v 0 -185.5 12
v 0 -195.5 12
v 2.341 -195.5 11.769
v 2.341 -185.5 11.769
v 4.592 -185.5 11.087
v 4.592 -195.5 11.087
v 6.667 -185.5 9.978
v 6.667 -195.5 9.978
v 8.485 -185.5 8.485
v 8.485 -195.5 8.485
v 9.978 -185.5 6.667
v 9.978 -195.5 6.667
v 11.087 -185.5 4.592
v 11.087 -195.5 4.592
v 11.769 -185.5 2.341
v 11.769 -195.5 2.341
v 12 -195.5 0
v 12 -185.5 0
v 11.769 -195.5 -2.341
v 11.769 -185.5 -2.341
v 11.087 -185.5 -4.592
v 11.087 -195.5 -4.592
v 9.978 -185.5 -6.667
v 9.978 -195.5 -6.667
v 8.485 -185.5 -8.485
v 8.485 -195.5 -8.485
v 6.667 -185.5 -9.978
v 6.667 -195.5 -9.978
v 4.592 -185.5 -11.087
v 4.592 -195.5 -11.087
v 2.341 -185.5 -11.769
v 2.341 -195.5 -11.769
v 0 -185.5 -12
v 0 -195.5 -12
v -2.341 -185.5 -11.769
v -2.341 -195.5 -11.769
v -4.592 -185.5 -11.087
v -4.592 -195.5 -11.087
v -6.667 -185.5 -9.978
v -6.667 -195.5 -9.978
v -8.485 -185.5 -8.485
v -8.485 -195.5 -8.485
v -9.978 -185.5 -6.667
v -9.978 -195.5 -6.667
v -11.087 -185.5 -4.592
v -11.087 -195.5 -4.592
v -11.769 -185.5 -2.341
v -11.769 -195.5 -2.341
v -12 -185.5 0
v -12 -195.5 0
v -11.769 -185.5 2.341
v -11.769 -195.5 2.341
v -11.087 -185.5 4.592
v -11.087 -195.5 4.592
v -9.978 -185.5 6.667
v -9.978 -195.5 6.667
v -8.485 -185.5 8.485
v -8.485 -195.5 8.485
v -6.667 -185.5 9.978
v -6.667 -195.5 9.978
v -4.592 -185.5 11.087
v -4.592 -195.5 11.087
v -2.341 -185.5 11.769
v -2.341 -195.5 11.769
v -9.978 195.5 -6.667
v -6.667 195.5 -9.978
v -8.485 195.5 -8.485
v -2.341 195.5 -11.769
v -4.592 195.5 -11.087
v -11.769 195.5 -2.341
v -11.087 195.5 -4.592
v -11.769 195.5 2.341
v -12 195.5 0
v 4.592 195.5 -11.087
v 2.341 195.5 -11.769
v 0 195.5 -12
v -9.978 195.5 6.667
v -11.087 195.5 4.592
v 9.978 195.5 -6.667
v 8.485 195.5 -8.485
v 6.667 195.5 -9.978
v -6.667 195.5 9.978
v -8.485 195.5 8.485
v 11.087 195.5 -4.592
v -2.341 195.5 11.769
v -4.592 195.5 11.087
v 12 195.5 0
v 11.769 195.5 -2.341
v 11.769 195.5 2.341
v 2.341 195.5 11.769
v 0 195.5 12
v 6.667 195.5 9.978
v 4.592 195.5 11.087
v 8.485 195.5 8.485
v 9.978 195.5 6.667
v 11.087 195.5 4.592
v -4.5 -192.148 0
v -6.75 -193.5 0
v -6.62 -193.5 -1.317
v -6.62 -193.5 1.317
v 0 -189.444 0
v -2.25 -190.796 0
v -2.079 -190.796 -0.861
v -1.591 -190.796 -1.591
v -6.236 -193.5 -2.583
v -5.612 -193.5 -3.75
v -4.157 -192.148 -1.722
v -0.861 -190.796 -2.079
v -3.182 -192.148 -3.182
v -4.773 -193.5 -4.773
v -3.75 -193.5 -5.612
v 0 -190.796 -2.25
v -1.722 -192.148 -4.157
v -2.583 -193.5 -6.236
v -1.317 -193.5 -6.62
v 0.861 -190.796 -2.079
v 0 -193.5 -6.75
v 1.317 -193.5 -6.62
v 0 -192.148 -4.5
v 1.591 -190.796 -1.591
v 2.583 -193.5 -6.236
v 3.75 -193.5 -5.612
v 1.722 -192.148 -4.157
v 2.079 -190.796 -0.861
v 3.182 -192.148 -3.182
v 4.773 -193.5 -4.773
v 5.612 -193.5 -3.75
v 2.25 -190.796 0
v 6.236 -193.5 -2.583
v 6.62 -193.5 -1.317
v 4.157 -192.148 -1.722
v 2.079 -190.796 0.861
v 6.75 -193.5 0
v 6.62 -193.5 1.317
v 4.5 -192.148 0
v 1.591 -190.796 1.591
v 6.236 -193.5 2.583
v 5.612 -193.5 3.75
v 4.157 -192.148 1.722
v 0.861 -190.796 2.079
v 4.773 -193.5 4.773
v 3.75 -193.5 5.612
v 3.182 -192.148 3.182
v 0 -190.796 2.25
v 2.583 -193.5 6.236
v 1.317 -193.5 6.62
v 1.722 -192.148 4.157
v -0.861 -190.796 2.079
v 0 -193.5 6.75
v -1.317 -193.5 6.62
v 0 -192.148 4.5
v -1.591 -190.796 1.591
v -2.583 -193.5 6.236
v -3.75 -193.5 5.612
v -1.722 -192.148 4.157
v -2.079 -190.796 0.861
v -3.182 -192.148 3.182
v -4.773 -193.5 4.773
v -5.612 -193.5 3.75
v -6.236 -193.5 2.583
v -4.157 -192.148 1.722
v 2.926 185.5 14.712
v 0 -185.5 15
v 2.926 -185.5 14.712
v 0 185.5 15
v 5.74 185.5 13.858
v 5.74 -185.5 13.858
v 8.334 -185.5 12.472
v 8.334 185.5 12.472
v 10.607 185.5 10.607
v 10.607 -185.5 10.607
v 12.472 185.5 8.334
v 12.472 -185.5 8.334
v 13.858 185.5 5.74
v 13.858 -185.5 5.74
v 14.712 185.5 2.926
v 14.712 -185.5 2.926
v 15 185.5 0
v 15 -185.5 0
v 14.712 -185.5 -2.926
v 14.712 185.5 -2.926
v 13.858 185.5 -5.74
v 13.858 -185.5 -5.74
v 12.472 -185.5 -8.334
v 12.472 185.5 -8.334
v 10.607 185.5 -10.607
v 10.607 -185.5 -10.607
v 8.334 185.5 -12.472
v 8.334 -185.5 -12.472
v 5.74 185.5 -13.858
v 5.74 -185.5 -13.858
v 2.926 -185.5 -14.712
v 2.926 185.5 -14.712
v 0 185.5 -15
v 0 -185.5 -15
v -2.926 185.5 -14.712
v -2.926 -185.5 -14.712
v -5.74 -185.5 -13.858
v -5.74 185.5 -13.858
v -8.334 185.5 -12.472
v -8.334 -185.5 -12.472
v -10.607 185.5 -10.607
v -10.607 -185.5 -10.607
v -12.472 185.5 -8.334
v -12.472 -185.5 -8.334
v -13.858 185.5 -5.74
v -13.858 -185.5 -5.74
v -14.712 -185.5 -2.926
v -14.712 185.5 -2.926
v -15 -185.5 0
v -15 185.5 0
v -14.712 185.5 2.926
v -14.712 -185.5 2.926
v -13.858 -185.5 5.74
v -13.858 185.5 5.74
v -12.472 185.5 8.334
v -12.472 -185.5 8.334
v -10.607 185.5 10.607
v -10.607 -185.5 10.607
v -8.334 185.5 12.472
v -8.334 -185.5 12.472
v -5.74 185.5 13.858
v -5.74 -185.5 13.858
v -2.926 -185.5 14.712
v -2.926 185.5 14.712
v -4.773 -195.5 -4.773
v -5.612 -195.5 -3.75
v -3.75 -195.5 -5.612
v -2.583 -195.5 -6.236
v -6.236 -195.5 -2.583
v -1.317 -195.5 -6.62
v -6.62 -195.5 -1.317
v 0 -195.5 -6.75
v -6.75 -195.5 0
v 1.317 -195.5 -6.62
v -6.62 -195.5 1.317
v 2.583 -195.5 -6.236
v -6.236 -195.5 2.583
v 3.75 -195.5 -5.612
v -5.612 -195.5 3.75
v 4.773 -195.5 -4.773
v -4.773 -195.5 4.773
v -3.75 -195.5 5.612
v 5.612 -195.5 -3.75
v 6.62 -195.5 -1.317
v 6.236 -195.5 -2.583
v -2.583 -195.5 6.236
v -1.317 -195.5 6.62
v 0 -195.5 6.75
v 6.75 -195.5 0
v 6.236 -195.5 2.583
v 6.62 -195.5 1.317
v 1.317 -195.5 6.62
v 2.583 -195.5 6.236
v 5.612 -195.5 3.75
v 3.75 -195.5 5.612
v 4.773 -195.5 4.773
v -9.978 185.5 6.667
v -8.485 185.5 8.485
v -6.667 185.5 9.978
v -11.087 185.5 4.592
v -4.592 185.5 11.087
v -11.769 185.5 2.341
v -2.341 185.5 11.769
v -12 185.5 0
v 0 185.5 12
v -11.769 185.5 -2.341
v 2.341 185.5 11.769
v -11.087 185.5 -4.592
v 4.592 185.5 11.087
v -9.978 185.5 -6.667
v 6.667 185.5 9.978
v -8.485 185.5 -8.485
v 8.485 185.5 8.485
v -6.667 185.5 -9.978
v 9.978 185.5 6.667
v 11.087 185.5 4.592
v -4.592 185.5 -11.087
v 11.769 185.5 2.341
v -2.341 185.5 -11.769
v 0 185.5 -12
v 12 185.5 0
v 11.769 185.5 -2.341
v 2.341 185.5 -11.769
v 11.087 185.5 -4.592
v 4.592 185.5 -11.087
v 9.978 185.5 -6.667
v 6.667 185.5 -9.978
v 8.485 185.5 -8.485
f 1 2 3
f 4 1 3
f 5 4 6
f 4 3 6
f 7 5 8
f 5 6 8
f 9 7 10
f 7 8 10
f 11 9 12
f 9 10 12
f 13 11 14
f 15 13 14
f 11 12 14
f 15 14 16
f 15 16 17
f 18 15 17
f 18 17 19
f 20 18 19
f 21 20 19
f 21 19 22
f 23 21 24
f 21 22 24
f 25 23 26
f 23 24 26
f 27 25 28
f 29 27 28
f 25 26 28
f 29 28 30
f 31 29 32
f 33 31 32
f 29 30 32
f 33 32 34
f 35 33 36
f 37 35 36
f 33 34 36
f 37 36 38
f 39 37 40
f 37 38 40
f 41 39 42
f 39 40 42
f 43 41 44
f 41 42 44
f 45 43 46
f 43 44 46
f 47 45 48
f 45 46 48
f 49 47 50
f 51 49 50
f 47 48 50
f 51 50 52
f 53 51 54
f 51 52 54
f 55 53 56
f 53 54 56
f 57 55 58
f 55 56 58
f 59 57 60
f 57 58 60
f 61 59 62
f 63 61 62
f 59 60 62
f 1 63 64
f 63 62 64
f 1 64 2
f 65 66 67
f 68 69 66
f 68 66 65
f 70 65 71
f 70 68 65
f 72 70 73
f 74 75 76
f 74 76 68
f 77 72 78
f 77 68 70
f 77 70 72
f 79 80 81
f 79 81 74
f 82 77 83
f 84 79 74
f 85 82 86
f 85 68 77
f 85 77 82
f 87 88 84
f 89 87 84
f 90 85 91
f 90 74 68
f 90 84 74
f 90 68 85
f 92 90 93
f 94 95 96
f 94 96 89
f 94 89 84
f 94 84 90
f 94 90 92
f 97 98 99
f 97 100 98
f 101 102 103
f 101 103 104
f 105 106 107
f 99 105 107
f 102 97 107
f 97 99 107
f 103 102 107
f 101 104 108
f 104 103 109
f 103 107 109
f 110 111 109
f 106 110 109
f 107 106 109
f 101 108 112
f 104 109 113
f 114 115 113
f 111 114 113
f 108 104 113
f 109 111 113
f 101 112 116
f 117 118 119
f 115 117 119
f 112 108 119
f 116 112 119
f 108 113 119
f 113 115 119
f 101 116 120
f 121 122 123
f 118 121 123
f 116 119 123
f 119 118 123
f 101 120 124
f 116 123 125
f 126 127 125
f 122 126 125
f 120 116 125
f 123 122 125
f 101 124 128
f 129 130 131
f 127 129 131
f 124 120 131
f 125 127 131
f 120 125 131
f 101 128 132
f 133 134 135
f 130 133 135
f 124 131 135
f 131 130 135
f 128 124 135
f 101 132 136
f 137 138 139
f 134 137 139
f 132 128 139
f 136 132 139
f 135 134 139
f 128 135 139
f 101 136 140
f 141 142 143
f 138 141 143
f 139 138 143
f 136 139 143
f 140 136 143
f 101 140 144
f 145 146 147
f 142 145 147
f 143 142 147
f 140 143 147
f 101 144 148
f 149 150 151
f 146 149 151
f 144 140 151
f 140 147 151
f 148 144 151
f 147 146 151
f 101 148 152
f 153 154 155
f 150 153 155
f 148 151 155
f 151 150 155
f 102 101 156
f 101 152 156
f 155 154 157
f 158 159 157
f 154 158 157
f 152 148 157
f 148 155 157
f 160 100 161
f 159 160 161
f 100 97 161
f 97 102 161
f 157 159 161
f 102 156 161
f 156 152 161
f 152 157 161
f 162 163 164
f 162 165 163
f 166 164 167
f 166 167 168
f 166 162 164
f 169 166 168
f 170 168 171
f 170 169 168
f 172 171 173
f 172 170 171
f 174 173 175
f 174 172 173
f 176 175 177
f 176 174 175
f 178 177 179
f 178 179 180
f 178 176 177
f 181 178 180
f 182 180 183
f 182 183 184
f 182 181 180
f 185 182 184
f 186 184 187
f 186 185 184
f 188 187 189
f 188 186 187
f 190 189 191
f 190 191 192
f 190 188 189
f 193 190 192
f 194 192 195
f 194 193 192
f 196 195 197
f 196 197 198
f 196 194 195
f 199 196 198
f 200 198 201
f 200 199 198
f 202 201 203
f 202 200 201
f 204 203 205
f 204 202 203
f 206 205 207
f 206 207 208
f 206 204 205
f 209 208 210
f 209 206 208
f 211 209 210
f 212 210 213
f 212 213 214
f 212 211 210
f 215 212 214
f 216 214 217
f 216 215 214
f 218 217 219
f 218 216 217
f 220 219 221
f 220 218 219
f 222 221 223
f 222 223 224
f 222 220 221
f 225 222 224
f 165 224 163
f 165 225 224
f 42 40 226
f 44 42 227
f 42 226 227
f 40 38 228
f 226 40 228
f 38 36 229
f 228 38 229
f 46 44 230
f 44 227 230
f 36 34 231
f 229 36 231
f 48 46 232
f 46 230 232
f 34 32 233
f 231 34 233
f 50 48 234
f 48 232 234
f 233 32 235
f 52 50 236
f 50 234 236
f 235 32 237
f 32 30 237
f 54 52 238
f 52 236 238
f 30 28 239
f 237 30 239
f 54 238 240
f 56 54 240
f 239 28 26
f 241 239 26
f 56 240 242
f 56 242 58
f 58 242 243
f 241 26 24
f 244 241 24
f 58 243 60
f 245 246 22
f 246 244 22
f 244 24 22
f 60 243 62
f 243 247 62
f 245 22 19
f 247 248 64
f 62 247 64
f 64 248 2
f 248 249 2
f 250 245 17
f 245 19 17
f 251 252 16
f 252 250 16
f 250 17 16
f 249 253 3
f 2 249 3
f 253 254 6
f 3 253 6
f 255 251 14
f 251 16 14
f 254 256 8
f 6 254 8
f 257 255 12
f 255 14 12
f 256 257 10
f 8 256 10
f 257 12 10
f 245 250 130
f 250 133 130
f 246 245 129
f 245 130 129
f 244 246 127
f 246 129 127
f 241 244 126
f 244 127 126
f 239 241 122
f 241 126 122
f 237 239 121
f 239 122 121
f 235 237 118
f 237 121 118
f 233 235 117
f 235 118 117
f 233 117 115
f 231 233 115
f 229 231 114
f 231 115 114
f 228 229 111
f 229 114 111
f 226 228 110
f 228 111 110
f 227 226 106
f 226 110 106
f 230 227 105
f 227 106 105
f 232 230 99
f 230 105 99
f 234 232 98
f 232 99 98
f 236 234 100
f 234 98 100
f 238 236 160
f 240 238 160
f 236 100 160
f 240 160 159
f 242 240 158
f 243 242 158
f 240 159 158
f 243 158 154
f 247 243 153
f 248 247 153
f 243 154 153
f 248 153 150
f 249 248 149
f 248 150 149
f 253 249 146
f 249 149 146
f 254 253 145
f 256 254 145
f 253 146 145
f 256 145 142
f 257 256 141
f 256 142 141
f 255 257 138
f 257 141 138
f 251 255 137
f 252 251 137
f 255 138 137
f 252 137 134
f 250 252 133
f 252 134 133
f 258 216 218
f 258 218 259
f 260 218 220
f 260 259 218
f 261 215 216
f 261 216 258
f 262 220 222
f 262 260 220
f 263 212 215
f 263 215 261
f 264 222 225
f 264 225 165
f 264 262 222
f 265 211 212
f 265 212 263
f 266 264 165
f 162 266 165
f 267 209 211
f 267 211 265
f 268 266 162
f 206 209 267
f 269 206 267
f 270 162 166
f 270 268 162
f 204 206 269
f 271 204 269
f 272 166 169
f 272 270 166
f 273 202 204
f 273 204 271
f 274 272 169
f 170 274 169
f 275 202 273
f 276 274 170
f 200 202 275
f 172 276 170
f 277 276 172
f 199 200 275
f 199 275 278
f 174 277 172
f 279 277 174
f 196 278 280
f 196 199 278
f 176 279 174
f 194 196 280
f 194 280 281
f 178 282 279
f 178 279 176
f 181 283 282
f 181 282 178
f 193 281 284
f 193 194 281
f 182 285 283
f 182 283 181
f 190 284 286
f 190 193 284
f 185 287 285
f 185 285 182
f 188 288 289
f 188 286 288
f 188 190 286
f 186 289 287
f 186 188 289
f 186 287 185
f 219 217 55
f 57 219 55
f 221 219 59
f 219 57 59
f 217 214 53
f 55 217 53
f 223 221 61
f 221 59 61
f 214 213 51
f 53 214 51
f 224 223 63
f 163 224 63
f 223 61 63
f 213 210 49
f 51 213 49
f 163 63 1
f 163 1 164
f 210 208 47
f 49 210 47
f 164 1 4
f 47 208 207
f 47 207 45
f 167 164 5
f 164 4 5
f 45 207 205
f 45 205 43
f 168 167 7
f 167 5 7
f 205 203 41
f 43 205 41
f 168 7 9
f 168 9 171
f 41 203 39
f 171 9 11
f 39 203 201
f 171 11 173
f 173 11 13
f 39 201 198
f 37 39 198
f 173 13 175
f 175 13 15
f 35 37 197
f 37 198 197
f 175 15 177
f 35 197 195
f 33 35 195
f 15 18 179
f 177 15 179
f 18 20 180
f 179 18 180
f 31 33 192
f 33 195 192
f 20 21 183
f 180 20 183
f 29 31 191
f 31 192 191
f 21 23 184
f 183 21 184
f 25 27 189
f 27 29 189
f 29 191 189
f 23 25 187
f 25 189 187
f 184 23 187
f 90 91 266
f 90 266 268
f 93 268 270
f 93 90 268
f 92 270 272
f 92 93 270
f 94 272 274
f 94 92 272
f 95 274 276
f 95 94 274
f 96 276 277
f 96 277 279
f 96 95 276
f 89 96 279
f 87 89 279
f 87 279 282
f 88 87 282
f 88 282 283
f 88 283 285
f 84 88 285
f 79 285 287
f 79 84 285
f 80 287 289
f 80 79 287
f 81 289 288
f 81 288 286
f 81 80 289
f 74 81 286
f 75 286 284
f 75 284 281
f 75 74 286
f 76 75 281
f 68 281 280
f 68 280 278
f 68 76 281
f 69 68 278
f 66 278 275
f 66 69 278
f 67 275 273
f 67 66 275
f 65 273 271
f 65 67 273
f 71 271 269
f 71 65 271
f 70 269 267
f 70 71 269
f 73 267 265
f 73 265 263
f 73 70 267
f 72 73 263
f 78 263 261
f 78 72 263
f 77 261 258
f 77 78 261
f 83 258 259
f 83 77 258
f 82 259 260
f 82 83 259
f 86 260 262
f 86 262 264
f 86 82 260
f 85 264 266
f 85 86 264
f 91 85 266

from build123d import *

# Parameters (mm, degrees)
SKETCH1_R                        = 15
BOSS_EXTRUDE1_DEPTH              = 195.5
SKETCH2_OUTSIDE_W                = 110.66
SKETCH2_OUTSIDE_H                = 110.66
SKETCH2_OUTSIDE_R                = 12
CUT_EXTRUDE1_DEPTH               = 10
F_13_5_13_5_DIAMETER_HOLE1_D     = 13.5
F_13_5_13_5_DIAMETER_HOLE1_DEPTH = 2
F_13_5_13_5_DIAMETER_HOLE1_TIP   = 4.055809178


with BuildPart() as part:
    # Sketch1 → Boss-Extrude1 (new, symmetric)
    with BuildSketch(Plane(origin=(0, 0, 0), x_dir=(1, 0, 0), z_dir=(0, 1, 0))):
        with Locations(Location((0, 0, 0), (0, 0, 270))):
            Circle(SKETCH1_R)
    extrude(amount=BOSS_EXTRUDE1_DEPTH, both=True)

    # Sketch2 outside → Cut-Extrude1 (cut)
    with BuildSketch(Plane(origin=(0, 195.5, 0), x_dir=(1, 0, 0), z_dir=(0, 1, 0))):
        Rectangle(SKETCH2_OUTSIDE_W, SKETCH2_OUTSIDE_H)
        with Locations(Location((0, 0, 0), (0, 0, 270))):
            Circle(SKETCH2_OUTSIDE_R, mode=Mode.SUBTRACT)
    cut_extrude1 = extrude(amount=-CUT_EXTRUDE1_DEPTH, mode=Mode.SUBTRACT)

    # Mirror1: Cut-Extrude1 across plane
    add(cut_extrude1.mirror(Plane.ZX), mode=Mode.SUBTRACT)

    # Ø13.5 (13.5) Diameter Hole1
    with Locations(Plane(origin=(0, -195.5, 0), x_dir=(-1, 0, 0), z_dir=(0, -1, 0))):
        with Locations((0, 0)):
            Hole(F_13_5_13_5_DIAMETER_HOLE1_D / 2, depth=F_13_5_13_5_DIAMETER_HOLE1_DEPTH)
            with Locations((0, 0, -(F_13_5_13_5_DIAMETER_HOLE1_DEPTH + F_13_5_13_5_DIAMETER_HOLE1_TIP / 2))):  # 118° drill point
                Cone(0, F_13_5_13_5_DIAMETER_HOLE1_D / 2, F_13_5_13_5_DIAMETER_HOLE1_TIP, mode=Mode.SUBTRACT)


solid = part.part
